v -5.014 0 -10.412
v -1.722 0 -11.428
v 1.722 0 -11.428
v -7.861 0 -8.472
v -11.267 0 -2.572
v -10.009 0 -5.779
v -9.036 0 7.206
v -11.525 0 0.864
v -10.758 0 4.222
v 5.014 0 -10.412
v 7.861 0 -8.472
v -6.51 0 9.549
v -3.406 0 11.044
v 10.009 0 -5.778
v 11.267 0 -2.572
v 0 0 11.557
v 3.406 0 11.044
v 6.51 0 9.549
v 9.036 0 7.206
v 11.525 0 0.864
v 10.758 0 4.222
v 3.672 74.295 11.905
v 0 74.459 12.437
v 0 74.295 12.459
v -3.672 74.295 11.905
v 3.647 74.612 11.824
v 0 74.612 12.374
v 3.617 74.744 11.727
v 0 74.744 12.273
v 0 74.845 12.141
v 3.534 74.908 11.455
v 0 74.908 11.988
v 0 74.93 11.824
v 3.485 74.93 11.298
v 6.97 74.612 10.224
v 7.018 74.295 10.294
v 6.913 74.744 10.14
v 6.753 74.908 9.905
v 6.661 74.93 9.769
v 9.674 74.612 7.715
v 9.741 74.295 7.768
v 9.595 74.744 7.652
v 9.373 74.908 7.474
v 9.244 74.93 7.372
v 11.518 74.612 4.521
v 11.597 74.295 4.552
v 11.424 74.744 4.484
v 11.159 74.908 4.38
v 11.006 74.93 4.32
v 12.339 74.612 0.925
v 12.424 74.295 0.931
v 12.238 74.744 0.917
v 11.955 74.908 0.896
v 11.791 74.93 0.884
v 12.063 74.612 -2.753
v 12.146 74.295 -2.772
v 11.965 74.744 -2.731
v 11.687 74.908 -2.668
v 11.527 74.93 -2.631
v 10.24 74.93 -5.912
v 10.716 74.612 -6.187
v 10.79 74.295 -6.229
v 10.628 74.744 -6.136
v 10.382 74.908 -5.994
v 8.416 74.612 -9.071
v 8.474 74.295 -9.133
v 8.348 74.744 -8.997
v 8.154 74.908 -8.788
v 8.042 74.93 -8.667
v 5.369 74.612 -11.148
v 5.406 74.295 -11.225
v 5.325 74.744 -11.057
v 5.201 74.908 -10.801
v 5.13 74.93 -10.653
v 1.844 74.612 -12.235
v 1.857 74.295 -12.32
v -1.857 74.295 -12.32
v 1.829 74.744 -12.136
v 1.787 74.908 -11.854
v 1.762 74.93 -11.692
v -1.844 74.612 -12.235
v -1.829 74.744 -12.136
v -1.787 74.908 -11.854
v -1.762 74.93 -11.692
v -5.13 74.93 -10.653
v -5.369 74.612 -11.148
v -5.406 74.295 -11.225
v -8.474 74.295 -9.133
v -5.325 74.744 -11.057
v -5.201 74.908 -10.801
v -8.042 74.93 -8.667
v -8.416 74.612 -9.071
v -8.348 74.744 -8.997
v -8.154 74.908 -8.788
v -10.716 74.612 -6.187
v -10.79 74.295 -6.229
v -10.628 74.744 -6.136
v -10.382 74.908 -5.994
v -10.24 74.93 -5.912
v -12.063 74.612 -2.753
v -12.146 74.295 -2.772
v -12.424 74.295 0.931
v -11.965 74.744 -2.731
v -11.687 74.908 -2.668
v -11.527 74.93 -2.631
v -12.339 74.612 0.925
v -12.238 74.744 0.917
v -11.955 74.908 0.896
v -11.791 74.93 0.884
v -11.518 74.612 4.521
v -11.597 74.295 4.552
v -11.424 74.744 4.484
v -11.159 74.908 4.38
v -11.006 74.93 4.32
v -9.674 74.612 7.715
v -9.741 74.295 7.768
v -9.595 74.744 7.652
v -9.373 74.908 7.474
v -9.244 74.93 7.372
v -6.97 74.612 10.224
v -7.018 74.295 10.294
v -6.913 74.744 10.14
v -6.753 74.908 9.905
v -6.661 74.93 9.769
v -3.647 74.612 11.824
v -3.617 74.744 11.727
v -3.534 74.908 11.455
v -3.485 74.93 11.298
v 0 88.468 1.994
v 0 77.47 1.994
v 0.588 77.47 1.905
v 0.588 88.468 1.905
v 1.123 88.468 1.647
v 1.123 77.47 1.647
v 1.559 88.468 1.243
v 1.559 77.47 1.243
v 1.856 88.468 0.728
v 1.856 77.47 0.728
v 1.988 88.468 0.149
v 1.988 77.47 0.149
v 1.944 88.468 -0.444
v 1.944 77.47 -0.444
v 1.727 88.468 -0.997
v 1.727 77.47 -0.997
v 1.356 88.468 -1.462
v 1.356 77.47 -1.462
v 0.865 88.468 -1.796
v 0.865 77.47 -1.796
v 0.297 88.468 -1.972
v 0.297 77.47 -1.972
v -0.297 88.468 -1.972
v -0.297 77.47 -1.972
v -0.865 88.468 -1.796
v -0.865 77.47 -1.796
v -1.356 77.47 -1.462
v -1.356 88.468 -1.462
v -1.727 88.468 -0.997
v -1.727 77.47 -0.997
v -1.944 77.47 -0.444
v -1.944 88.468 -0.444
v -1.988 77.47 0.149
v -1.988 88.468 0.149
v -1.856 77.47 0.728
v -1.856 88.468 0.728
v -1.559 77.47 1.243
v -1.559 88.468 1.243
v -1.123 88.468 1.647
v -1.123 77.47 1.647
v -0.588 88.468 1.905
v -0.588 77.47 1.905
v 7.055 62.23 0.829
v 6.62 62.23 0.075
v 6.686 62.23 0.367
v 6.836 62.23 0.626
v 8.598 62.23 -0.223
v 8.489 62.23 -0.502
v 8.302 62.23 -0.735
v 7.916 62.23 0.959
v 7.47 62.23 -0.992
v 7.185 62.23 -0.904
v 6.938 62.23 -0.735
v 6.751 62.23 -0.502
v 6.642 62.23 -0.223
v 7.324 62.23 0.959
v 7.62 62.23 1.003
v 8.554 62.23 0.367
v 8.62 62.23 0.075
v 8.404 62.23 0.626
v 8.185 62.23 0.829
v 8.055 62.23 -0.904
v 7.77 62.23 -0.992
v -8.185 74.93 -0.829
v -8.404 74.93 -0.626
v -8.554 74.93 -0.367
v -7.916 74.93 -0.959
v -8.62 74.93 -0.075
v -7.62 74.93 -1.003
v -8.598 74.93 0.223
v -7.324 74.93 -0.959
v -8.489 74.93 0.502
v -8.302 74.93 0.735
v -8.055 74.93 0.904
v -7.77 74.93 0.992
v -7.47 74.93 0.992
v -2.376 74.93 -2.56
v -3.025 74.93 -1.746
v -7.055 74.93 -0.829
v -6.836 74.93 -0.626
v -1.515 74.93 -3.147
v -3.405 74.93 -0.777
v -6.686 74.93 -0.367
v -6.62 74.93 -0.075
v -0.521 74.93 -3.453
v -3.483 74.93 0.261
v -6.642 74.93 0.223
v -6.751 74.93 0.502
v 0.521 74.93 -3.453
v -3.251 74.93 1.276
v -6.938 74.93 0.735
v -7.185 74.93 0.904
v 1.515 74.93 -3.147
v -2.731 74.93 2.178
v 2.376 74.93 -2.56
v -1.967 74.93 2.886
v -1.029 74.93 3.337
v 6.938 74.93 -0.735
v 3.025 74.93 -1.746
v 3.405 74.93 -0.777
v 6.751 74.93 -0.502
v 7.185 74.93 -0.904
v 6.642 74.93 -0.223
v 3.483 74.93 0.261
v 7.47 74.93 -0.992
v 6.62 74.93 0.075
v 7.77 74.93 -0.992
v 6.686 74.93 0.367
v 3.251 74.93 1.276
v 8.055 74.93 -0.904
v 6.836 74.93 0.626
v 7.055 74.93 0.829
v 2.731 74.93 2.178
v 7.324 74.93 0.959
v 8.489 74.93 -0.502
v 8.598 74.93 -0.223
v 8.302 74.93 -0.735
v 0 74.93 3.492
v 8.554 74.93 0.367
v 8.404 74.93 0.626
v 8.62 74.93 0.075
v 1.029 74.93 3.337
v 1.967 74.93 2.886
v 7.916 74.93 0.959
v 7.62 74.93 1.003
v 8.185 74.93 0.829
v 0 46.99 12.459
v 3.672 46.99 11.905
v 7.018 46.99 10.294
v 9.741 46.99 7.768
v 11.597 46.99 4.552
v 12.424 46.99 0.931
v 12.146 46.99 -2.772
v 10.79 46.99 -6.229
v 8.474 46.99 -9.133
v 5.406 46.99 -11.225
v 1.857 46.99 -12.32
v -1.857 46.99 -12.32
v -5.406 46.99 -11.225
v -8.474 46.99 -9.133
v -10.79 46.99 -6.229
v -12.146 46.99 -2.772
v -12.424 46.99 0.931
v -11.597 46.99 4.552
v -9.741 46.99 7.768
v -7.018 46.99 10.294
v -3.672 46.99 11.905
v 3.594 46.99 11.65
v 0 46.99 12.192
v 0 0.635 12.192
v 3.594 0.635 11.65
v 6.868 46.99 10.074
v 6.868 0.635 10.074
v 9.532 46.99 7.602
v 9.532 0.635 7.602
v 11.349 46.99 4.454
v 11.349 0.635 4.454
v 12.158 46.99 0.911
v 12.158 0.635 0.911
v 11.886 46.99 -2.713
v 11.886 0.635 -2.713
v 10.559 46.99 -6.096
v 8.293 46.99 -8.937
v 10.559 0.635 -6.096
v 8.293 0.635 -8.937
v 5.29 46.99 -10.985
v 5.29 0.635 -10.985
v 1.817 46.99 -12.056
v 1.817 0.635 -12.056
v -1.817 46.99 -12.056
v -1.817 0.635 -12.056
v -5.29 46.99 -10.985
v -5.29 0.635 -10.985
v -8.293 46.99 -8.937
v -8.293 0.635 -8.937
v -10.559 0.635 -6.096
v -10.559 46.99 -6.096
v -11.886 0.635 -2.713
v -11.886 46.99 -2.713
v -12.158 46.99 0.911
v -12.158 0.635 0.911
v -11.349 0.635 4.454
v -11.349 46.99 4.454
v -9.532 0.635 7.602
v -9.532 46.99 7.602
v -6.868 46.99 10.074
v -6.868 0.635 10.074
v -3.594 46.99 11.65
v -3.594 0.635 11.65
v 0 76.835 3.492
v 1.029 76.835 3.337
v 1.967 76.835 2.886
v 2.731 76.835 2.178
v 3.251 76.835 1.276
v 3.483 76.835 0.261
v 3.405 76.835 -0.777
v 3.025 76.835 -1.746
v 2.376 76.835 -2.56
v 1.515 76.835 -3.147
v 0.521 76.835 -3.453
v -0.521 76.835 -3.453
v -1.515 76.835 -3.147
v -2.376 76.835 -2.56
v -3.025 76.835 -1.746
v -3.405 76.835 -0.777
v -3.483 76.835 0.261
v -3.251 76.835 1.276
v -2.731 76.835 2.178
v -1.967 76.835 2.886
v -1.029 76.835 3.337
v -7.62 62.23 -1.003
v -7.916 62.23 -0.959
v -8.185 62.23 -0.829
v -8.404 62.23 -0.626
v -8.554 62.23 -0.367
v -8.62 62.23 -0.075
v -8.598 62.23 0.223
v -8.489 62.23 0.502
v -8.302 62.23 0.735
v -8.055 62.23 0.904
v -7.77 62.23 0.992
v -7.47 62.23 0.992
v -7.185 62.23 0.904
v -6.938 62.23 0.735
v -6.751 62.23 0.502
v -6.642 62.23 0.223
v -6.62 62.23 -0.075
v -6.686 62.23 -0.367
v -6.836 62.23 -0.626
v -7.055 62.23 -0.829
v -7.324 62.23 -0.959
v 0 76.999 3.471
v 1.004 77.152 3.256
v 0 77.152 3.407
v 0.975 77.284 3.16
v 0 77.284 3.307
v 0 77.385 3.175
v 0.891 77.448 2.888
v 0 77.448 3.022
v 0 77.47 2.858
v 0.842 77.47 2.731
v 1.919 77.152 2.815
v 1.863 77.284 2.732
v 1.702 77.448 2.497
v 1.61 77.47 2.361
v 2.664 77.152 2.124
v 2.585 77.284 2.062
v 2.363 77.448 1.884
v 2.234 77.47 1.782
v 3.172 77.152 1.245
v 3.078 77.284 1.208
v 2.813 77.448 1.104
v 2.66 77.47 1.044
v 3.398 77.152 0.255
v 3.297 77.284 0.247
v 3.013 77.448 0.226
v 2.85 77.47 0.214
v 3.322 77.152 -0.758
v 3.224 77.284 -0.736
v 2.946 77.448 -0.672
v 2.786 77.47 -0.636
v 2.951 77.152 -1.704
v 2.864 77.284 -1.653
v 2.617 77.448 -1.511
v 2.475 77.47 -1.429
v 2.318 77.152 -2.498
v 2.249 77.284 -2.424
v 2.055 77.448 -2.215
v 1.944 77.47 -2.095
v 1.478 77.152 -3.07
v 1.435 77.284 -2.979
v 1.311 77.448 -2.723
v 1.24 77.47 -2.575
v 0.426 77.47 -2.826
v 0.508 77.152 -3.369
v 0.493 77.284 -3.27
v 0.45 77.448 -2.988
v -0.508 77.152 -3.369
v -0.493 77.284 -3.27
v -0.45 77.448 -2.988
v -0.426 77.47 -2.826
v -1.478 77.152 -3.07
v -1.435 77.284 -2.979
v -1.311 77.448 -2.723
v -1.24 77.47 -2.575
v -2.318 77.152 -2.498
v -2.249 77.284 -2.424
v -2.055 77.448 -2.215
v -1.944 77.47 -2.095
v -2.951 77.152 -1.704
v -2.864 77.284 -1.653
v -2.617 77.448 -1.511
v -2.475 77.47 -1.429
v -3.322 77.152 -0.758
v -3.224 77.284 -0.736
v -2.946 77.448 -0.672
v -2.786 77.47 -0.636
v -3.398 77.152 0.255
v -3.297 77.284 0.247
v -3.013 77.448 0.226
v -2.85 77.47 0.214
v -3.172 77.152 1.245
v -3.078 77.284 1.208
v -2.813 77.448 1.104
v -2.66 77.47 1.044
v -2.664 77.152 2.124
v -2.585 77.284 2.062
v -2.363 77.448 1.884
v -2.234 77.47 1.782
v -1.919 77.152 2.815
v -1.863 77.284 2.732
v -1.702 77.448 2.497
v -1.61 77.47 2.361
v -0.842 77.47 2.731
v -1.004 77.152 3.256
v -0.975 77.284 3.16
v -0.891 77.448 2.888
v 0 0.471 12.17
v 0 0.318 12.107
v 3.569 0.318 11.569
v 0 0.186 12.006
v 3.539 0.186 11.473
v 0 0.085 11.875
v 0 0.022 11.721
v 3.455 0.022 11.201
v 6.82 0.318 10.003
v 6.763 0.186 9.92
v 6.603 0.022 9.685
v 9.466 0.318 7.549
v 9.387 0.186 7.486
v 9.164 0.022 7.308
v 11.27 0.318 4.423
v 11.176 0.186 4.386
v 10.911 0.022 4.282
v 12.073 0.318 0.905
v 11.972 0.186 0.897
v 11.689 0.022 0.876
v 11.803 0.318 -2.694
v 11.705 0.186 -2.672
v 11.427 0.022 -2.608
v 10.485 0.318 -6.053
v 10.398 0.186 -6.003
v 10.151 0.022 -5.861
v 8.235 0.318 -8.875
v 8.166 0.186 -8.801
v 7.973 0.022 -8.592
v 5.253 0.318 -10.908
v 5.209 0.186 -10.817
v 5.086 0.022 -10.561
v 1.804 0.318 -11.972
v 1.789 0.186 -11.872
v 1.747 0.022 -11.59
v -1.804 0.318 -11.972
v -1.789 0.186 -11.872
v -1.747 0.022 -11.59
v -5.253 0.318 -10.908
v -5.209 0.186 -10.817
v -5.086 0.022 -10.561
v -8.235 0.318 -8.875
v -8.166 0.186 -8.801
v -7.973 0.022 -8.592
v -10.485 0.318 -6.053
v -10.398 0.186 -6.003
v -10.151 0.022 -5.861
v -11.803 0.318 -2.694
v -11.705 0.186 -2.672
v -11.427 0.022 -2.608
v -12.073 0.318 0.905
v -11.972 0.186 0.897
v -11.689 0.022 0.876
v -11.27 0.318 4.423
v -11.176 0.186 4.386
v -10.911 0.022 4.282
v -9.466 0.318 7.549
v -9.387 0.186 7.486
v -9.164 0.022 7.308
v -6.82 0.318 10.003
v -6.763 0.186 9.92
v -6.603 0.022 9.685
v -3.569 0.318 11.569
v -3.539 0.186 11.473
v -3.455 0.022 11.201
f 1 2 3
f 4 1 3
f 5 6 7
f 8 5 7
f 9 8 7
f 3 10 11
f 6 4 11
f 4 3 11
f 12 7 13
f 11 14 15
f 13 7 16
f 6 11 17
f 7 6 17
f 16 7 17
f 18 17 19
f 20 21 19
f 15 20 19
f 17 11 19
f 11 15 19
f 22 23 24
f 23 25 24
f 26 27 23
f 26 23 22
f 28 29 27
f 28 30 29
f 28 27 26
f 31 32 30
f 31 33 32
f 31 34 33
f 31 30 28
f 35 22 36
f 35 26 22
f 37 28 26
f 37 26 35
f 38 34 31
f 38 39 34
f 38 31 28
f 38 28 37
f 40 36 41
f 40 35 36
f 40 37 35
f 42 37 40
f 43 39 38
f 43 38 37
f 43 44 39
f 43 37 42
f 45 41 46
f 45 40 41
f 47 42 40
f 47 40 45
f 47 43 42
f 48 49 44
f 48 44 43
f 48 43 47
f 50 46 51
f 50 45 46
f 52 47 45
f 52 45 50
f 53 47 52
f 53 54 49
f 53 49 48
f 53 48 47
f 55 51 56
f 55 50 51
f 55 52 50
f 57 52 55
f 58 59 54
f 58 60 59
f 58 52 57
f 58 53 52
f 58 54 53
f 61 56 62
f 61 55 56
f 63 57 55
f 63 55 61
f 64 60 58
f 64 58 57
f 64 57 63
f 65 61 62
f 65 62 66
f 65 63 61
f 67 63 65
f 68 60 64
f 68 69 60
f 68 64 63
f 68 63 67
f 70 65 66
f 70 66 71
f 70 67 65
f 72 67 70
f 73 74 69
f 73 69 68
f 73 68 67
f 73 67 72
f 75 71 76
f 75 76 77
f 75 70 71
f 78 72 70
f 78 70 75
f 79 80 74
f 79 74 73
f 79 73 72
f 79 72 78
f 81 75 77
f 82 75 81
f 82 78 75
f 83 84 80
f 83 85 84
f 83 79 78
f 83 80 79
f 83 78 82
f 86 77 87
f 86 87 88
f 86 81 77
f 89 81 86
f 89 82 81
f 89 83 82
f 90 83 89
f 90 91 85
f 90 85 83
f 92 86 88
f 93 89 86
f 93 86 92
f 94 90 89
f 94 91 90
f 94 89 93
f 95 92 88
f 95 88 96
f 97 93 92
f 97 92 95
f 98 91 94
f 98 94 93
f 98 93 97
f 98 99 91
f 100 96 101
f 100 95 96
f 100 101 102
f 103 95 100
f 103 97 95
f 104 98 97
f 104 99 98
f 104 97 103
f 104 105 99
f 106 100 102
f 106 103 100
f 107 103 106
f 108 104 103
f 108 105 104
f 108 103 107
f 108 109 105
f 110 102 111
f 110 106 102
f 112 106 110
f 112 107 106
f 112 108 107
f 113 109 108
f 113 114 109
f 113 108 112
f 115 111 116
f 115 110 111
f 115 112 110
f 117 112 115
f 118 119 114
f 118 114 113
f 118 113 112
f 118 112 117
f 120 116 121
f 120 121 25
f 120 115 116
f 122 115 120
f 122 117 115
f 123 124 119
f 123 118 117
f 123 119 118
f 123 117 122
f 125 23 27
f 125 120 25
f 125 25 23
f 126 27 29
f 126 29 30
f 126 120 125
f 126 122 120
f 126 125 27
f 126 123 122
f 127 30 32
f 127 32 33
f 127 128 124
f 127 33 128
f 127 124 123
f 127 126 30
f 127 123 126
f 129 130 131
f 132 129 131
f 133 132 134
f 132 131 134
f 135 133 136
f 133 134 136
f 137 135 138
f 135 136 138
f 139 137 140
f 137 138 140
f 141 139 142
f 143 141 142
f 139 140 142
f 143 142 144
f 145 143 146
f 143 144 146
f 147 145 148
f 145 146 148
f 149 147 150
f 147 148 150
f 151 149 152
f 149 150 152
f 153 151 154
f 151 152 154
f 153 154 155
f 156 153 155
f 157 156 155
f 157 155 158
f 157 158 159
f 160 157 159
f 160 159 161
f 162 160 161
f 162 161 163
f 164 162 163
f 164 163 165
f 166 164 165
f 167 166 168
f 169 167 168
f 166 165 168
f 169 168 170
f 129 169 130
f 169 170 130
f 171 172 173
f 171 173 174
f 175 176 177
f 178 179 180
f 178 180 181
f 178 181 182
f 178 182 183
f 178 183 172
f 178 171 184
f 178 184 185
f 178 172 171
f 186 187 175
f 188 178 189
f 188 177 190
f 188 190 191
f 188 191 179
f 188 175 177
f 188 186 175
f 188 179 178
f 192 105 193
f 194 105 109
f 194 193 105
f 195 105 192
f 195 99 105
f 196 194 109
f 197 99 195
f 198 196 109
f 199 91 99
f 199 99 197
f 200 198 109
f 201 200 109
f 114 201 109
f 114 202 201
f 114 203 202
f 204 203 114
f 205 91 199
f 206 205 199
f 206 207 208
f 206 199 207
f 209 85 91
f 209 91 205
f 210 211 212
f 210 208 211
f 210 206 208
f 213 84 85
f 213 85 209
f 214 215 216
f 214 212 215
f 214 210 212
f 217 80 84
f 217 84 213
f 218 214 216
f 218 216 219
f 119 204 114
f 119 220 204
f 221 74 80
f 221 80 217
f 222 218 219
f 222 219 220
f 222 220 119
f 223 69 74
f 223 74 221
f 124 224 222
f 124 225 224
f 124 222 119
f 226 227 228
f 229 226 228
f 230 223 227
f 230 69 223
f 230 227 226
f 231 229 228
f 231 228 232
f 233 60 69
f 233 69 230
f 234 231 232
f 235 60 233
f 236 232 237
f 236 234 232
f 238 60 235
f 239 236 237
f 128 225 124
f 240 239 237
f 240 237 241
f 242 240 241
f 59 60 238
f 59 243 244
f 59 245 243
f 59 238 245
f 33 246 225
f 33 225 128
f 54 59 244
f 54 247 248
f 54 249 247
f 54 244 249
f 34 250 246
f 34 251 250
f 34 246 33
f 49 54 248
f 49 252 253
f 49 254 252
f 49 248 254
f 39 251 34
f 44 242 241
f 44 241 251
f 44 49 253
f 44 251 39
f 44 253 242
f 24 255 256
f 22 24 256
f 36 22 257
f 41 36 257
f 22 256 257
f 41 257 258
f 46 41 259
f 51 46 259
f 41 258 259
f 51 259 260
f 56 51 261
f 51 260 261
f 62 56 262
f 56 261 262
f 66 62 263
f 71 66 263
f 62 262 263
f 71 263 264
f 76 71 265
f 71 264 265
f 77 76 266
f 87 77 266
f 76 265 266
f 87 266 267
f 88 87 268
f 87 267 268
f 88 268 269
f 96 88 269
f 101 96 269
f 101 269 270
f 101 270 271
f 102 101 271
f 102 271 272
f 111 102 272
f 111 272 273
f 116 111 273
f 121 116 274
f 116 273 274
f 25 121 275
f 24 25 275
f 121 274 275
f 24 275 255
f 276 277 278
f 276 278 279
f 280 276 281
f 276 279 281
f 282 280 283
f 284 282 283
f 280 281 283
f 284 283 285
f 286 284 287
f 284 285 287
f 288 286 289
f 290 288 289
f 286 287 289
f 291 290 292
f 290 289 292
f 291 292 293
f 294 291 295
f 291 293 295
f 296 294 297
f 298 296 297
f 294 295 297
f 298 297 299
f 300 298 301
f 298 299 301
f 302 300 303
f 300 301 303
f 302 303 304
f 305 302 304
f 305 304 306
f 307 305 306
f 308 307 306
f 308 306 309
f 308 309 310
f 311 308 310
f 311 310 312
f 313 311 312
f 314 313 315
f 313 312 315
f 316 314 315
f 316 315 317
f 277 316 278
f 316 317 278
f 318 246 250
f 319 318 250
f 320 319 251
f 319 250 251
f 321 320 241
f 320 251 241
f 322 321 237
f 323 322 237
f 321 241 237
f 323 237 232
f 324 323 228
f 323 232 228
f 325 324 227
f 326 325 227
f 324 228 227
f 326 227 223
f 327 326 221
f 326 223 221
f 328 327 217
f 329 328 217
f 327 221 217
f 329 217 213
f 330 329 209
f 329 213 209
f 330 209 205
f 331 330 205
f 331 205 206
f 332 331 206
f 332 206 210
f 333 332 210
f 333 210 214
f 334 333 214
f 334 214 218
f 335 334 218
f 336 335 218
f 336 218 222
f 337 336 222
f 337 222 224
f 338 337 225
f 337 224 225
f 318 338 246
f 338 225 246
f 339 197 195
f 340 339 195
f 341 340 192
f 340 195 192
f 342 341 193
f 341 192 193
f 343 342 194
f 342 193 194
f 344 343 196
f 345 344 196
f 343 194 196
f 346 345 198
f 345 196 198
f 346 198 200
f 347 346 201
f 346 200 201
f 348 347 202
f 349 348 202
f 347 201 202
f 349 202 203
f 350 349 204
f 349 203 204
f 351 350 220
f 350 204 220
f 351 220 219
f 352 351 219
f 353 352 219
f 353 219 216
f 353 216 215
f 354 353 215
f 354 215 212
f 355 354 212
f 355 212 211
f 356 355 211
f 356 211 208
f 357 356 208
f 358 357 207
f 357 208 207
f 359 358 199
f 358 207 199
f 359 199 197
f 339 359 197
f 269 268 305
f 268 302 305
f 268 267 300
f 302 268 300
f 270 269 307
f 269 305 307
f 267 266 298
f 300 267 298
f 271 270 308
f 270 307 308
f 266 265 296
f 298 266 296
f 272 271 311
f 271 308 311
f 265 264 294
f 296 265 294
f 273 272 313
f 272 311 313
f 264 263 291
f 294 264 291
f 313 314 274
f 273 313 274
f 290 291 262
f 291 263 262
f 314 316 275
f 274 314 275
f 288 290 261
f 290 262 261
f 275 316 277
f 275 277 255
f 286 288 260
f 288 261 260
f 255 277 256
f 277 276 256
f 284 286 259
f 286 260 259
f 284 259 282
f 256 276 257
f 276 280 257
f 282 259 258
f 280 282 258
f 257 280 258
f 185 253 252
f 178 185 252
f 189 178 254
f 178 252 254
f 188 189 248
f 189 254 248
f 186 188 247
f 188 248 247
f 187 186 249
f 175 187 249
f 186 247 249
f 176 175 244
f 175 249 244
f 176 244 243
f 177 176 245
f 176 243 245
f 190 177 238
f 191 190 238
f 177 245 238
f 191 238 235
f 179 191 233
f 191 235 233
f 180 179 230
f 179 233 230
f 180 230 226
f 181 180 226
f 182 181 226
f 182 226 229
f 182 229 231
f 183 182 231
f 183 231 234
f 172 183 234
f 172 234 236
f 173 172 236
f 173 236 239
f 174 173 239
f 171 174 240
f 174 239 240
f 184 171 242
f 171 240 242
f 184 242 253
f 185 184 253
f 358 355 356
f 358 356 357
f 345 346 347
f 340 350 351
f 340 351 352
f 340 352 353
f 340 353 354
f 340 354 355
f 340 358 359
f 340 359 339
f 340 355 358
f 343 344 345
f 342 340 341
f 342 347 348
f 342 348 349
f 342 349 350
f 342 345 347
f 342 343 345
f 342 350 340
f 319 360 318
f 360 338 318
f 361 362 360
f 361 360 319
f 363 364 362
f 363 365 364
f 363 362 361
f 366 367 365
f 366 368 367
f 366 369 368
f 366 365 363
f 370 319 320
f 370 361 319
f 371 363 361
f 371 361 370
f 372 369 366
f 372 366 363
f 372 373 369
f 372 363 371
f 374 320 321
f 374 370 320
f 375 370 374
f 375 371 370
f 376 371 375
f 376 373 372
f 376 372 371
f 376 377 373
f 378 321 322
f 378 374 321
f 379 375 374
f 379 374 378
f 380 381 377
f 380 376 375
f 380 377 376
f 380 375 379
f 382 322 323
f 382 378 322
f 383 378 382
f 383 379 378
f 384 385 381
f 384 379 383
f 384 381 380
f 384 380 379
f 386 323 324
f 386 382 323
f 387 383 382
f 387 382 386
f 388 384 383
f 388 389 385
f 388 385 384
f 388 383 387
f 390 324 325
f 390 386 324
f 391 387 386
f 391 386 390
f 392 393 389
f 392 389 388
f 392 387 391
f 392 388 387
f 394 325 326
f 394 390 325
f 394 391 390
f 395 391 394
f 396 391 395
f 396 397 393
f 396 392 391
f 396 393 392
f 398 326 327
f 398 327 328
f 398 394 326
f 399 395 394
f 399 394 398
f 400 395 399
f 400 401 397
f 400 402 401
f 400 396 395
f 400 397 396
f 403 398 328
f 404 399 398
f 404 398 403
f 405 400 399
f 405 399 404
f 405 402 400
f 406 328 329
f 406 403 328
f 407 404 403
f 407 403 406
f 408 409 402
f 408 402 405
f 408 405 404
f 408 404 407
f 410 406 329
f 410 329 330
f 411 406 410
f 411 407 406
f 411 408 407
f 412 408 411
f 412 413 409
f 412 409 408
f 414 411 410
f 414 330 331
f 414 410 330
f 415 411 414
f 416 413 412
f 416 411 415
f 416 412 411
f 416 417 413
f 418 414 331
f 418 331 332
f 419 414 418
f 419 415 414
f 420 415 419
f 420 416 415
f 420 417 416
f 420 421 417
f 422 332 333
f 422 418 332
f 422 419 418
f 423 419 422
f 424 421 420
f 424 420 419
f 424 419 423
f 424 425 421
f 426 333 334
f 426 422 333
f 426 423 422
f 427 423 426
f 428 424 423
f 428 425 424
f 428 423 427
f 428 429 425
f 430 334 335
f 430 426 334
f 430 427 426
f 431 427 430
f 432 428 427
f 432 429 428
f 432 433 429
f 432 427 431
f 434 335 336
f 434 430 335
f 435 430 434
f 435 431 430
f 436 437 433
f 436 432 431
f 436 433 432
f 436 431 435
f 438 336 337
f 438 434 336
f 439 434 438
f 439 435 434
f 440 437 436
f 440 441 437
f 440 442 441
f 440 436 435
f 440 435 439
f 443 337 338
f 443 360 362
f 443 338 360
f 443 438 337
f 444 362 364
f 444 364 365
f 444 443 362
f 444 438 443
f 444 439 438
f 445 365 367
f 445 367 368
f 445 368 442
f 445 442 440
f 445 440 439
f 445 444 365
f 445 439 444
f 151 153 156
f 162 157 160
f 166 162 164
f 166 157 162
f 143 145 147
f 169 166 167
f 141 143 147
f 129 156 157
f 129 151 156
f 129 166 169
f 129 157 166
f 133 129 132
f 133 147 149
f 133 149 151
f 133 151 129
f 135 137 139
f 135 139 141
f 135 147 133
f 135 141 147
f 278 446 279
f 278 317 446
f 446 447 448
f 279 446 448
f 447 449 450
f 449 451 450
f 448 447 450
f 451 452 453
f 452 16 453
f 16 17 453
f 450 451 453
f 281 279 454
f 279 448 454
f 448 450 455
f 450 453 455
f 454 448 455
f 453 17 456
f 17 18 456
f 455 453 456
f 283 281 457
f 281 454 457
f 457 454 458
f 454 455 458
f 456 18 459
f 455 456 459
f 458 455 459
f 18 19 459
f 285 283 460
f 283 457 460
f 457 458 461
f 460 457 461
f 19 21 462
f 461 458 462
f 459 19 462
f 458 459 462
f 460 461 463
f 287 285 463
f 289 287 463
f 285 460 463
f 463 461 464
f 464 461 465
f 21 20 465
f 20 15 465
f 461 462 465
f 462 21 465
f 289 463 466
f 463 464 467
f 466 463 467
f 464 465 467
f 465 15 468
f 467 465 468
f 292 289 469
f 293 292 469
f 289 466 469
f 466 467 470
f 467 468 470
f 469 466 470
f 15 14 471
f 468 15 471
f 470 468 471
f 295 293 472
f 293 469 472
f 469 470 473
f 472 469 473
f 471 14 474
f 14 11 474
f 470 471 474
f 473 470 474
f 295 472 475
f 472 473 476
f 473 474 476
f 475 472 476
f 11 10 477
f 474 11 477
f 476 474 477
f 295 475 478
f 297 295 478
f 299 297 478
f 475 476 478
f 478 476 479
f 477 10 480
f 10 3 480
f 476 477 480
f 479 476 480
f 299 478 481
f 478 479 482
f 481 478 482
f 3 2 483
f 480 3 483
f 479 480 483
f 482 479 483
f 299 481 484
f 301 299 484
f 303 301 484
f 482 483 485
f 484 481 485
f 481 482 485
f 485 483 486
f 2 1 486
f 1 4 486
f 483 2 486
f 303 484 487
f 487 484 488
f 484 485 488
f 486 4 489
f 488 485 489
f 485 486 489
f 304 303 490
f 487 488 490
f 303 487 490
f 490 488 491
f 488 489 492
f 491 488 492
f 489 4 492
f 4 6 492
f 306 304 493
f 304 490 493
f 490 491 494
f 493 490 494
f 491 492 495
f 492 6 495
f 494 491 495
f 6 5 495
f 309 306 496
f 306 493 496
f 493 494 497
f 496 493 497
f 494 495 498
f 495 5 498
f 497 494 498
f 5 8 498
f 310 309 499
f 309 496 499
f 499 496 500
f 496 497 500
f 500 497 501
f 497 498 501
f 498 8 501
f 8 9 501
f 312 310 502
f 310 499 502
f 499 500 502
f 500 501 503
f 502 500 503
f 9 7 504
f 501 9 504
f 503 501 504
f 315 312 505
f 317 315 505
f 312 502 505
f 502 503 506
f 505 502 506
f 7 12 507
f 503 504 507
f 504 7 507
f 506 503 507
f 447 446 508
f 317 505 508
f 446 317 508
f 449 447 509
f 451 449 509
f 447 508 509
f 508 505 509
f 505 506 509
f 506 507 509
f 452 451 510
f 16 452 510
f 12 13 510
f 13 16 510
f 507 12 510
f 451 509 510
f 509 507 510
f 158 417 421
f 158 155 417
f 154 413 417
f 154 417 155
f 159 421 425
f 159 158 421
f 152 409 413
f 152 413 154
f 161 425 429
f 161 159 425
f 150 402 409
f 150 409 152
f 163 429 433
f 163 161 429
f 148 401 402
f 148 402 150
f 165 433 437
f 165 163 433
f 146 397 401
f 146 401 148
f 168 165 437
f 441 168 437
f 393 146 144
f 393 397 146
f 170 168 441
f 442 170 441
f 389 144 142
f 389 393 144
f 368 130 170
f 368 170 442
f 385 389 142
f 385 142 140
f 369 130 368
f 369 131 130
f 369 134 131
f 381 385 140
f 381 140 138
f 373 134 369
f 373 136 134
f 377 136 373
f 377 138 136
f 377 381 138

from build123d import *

# Parameters (mm, degrees)
SKETCH1_R           = 12.192
BOSS_EXTRUDE1_DEPTH = 46.99
SKETCH2_R           = 12.4587
BOSS_EXTRUDE2_DEPTH = 27.94
SKETCH3_R           = 3.4925
BOSS_EXTRUDE3_DEPTH = 2.54
SKETCH4_R           = 1.9939
BOSS_EXTRUDE4_DEPTH = 10.9982
FILLET1_R           = 0.635
FILLET2_R           = 0.635
SKETCH5_R           = 1.0033
CUT_EXTRUDE1_DEPTH  = 12.7


with BuildPart() as part:
    # Sketch1 → Boss-Extrude1 (new body)
    with BuildSketch(Plane(origin=(0, 0, 0), x_dir=(1, 0, 0), z_dir=(0, 1, 0))):
        with Locations(Location((0, 0, 0), (0, 0, 270))):
            Circle(SKETCH1_R)
    extrude(amount=BOSS_EXTRUDE1_DEPTH)

    # Sketch2 → Boss-Extrude2 (add)
    with BuildSketch(Plane(origin=(0, 46.99, 0), x_dir=(1, 0, 0), z_dir=(0, 1, 0))):
        with Locations(Location((0, 0, 0), (0, 0, 270))):
            Circle(SKETCH2_R)
    extrude(amount=BOSS_EXTRUDE2_DEPTH)

    # Sketch3 → Boss-Extrude3 (add)
    with BuildSketch(Plane(origin=(0, 74.93, 0), x_dir=(1, 0, 0), z_dir=(0, 1, 0))):
        with Locations(Location((0, 0, 0), (0, 0, 270))):
            Circle(SKETCH3_R)
    extrude(amount=BOSS_EXTRUDE3_DEPTH)

    # Sketch4 → Boss-Extrude4 (add)
    with BuildSketch(Plane(origin=(0, 77.47, 0), x_dir=(1, 0, 0), z_dir=(0, 1, 0))):
        with Locations(Location((0, 0, 0), (0, 0, 270))):
            Circle(SKETCH4_R)
    extrude(amount=BOSS_EXTRUDE4_DEPTH)

    # Fillet1
    fillet1_edges = [part.edges().sort_by_distance(p)[0] for p in [
        (0, 0, -12.192),
        (0, 74.93, -12.4587),
    ]]
    fillet(fillet1_edges, radius=FILLET1_R)

    # Fillet2
    fillet2_edges = [part.edges().sort_by_distance(p)[0] for p in [
        (0, 77.47, -3.4925),
    ]]
    fillet(fillet2_edges, radius=FILLET2_R)

    # Sketch5 → Cut-Extrude1 (cut)
    with BuildSketch(Plane(origin=(0, 74.93, 0), x_dir=(1, 0, 0), z_dir=(0, 1, 0))):
        with Locations(Location((7.62, 0, 0), (0, 0, 270))):
            Circle(SKETCH5_R)
        with Locations(Location((-7.62, 0, 0), (0, 0, 90))):
            Circle(SKETCH5_R)
    extrude(amount=-CUT_EXTRUDE1_DEPTH, mode=Mode.SUBTRACT)


solid = part.part
